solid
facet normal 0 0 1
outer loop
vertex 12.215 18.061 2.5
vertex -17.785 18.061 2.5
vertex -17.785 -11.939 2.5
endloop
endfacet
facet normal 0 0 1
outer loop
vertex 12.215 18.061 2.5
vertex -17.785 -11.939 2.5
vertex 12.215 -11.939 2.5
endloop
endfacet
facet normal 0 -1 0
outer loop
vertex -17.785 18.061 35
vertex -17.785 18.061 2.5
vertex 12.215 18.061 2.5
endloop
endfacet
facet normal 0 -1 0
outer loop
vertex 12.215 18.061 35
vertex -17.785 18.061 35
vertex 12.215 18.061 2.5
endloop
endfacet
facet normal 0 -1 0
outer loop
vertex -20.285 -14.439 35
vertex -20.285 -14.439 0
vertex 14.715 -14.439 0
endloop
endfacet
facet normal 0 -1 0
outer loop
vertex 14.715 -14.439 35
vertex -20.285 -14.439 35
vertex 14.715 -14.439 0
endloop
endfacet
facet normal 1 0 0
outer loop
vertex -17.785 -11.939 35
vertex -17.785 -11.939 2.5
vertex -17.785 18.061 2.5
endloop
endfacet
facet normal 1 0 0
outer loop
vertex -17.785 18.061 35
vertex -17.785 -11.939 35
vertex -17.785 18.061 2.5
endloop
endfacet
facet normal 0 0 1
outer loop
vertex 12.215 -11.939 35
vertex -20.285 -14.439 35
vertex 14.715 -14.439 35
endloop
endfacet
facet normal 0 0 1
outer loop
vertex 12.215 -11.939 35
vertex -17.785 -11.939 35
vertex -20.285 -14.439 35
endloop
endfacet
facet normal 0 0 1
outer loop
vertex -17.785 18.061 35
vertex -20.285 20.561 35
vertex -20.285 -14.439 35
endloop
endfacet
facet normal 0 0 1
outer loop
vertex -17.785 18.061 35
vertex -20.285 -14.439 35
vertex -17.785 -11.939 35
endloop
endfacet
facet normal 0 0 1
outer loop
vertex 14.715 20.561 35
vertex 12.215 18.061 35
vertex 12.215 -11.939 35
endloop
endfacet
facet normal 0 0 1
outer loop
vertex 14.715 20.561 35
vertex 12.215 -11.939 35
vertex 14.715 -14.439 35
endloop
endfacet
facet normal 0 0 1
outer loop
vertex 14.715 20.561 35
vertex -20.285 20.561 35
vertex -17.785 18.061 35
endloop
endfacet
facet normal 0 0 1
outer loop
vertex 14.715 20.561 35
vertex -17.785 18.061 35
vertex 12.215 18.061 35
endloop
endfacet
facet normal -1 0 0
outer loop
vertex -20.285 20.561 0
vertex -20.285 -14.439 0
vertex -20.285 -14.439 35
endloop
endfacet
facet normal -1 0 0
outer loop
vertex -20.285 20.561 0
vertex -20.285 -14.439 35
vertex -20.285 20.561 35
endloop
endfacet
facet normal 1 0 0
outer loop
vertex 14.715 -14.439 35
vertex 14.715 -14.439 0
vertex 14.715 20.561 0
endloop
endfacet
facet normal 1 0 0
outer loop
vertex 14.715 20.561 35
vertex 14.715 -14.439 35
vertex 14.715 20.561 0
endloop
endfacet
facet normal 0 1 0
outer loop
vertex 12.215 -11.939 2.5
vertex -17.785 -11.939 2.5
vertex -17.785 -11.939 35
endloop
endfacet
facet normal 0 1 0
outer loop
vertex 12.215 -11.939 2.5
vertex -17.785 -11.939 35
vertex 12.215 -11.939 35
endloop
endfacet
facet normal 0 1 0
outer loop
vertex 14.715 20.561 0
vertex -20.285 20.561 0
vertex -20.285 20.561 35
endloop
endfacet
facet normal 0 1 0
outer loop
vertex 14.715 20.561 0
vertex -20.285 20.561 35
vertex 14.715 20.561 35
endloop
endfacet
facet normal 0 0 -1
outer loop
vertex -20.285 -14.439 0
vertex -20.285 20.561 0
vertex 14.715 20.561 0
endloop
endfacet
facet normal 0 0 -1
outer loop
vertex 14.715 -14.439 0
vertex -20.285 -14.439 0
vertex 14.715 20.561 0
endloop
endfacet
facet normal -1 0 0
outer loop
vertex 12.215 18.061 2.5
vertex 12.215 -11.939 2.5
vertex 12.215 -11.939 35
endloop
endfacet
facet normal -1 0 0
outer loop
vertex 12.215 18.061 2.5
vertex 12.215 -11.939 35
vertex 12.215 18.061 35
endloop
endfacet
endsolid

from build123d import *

# Parameters (mm, degrees)
SKETCH4_W           = 35
SKETCH4_H           = 35
BOSS_EXTRUDE2_DEPTH = 35
SKETCH5_OUTSIDE_W   = 49.124
SKETCH5_OUTSIDE_H   = 49.124
SKETCH5_OUTSIDE_W_2 = 35
SKETCH5_OUTSIDE_H_2 = 35
SKETCH5_OUTSIDE_W_3 = 30
SKETCH5_OUTSIDE_H_3 = 30
CUT_EXTRUDE2_DEPTH  = 32.5


with BuildPart() as part:
    # Sketch4 → Boss-Extrude2 (new body)
    with BuildSketch(Plane.XY):
        with Locations((-2.784904398, 3.060708191)):
            Rectangle(SKETCH4_W, SKETCH4_H)
    extrude(amount=BOSS_EXTRUDE2_DEPTH)

    # Sketch5 outside → Cut-Extrude2 (cut)
    # profile 1 of 2: a face of its own
    with BuildSketch(Plane.XY.offset(35)):
        with Locations((-2.785, 3.061)):
            Rectangle(SKETCH5_OUTSIDE_W, SKETCH5_OUTSIDE_H)
        with Locations((-2.784904398, 3.060708191)):
            Rectangle(SKETCH5_OUTSIDE_W_2, SKETCH5_OUTSIDE_H_2, mode=Mode.SUBTRACT)
    # profile 2 of 2: a face of its own
    with BuildSketch(Plane.XY.offset(35)):
        with Locations((-2.784904398, 3.060708191)):
            Rectangle(SKETCH5_OUTSIDE_W_3, SKETCH5_OUTSIDE_H_3)
    extrude(amount=-CUT_EXTRUDE2_DEPTH, mode=Mode.SUBTRACT)


solid = part.part
